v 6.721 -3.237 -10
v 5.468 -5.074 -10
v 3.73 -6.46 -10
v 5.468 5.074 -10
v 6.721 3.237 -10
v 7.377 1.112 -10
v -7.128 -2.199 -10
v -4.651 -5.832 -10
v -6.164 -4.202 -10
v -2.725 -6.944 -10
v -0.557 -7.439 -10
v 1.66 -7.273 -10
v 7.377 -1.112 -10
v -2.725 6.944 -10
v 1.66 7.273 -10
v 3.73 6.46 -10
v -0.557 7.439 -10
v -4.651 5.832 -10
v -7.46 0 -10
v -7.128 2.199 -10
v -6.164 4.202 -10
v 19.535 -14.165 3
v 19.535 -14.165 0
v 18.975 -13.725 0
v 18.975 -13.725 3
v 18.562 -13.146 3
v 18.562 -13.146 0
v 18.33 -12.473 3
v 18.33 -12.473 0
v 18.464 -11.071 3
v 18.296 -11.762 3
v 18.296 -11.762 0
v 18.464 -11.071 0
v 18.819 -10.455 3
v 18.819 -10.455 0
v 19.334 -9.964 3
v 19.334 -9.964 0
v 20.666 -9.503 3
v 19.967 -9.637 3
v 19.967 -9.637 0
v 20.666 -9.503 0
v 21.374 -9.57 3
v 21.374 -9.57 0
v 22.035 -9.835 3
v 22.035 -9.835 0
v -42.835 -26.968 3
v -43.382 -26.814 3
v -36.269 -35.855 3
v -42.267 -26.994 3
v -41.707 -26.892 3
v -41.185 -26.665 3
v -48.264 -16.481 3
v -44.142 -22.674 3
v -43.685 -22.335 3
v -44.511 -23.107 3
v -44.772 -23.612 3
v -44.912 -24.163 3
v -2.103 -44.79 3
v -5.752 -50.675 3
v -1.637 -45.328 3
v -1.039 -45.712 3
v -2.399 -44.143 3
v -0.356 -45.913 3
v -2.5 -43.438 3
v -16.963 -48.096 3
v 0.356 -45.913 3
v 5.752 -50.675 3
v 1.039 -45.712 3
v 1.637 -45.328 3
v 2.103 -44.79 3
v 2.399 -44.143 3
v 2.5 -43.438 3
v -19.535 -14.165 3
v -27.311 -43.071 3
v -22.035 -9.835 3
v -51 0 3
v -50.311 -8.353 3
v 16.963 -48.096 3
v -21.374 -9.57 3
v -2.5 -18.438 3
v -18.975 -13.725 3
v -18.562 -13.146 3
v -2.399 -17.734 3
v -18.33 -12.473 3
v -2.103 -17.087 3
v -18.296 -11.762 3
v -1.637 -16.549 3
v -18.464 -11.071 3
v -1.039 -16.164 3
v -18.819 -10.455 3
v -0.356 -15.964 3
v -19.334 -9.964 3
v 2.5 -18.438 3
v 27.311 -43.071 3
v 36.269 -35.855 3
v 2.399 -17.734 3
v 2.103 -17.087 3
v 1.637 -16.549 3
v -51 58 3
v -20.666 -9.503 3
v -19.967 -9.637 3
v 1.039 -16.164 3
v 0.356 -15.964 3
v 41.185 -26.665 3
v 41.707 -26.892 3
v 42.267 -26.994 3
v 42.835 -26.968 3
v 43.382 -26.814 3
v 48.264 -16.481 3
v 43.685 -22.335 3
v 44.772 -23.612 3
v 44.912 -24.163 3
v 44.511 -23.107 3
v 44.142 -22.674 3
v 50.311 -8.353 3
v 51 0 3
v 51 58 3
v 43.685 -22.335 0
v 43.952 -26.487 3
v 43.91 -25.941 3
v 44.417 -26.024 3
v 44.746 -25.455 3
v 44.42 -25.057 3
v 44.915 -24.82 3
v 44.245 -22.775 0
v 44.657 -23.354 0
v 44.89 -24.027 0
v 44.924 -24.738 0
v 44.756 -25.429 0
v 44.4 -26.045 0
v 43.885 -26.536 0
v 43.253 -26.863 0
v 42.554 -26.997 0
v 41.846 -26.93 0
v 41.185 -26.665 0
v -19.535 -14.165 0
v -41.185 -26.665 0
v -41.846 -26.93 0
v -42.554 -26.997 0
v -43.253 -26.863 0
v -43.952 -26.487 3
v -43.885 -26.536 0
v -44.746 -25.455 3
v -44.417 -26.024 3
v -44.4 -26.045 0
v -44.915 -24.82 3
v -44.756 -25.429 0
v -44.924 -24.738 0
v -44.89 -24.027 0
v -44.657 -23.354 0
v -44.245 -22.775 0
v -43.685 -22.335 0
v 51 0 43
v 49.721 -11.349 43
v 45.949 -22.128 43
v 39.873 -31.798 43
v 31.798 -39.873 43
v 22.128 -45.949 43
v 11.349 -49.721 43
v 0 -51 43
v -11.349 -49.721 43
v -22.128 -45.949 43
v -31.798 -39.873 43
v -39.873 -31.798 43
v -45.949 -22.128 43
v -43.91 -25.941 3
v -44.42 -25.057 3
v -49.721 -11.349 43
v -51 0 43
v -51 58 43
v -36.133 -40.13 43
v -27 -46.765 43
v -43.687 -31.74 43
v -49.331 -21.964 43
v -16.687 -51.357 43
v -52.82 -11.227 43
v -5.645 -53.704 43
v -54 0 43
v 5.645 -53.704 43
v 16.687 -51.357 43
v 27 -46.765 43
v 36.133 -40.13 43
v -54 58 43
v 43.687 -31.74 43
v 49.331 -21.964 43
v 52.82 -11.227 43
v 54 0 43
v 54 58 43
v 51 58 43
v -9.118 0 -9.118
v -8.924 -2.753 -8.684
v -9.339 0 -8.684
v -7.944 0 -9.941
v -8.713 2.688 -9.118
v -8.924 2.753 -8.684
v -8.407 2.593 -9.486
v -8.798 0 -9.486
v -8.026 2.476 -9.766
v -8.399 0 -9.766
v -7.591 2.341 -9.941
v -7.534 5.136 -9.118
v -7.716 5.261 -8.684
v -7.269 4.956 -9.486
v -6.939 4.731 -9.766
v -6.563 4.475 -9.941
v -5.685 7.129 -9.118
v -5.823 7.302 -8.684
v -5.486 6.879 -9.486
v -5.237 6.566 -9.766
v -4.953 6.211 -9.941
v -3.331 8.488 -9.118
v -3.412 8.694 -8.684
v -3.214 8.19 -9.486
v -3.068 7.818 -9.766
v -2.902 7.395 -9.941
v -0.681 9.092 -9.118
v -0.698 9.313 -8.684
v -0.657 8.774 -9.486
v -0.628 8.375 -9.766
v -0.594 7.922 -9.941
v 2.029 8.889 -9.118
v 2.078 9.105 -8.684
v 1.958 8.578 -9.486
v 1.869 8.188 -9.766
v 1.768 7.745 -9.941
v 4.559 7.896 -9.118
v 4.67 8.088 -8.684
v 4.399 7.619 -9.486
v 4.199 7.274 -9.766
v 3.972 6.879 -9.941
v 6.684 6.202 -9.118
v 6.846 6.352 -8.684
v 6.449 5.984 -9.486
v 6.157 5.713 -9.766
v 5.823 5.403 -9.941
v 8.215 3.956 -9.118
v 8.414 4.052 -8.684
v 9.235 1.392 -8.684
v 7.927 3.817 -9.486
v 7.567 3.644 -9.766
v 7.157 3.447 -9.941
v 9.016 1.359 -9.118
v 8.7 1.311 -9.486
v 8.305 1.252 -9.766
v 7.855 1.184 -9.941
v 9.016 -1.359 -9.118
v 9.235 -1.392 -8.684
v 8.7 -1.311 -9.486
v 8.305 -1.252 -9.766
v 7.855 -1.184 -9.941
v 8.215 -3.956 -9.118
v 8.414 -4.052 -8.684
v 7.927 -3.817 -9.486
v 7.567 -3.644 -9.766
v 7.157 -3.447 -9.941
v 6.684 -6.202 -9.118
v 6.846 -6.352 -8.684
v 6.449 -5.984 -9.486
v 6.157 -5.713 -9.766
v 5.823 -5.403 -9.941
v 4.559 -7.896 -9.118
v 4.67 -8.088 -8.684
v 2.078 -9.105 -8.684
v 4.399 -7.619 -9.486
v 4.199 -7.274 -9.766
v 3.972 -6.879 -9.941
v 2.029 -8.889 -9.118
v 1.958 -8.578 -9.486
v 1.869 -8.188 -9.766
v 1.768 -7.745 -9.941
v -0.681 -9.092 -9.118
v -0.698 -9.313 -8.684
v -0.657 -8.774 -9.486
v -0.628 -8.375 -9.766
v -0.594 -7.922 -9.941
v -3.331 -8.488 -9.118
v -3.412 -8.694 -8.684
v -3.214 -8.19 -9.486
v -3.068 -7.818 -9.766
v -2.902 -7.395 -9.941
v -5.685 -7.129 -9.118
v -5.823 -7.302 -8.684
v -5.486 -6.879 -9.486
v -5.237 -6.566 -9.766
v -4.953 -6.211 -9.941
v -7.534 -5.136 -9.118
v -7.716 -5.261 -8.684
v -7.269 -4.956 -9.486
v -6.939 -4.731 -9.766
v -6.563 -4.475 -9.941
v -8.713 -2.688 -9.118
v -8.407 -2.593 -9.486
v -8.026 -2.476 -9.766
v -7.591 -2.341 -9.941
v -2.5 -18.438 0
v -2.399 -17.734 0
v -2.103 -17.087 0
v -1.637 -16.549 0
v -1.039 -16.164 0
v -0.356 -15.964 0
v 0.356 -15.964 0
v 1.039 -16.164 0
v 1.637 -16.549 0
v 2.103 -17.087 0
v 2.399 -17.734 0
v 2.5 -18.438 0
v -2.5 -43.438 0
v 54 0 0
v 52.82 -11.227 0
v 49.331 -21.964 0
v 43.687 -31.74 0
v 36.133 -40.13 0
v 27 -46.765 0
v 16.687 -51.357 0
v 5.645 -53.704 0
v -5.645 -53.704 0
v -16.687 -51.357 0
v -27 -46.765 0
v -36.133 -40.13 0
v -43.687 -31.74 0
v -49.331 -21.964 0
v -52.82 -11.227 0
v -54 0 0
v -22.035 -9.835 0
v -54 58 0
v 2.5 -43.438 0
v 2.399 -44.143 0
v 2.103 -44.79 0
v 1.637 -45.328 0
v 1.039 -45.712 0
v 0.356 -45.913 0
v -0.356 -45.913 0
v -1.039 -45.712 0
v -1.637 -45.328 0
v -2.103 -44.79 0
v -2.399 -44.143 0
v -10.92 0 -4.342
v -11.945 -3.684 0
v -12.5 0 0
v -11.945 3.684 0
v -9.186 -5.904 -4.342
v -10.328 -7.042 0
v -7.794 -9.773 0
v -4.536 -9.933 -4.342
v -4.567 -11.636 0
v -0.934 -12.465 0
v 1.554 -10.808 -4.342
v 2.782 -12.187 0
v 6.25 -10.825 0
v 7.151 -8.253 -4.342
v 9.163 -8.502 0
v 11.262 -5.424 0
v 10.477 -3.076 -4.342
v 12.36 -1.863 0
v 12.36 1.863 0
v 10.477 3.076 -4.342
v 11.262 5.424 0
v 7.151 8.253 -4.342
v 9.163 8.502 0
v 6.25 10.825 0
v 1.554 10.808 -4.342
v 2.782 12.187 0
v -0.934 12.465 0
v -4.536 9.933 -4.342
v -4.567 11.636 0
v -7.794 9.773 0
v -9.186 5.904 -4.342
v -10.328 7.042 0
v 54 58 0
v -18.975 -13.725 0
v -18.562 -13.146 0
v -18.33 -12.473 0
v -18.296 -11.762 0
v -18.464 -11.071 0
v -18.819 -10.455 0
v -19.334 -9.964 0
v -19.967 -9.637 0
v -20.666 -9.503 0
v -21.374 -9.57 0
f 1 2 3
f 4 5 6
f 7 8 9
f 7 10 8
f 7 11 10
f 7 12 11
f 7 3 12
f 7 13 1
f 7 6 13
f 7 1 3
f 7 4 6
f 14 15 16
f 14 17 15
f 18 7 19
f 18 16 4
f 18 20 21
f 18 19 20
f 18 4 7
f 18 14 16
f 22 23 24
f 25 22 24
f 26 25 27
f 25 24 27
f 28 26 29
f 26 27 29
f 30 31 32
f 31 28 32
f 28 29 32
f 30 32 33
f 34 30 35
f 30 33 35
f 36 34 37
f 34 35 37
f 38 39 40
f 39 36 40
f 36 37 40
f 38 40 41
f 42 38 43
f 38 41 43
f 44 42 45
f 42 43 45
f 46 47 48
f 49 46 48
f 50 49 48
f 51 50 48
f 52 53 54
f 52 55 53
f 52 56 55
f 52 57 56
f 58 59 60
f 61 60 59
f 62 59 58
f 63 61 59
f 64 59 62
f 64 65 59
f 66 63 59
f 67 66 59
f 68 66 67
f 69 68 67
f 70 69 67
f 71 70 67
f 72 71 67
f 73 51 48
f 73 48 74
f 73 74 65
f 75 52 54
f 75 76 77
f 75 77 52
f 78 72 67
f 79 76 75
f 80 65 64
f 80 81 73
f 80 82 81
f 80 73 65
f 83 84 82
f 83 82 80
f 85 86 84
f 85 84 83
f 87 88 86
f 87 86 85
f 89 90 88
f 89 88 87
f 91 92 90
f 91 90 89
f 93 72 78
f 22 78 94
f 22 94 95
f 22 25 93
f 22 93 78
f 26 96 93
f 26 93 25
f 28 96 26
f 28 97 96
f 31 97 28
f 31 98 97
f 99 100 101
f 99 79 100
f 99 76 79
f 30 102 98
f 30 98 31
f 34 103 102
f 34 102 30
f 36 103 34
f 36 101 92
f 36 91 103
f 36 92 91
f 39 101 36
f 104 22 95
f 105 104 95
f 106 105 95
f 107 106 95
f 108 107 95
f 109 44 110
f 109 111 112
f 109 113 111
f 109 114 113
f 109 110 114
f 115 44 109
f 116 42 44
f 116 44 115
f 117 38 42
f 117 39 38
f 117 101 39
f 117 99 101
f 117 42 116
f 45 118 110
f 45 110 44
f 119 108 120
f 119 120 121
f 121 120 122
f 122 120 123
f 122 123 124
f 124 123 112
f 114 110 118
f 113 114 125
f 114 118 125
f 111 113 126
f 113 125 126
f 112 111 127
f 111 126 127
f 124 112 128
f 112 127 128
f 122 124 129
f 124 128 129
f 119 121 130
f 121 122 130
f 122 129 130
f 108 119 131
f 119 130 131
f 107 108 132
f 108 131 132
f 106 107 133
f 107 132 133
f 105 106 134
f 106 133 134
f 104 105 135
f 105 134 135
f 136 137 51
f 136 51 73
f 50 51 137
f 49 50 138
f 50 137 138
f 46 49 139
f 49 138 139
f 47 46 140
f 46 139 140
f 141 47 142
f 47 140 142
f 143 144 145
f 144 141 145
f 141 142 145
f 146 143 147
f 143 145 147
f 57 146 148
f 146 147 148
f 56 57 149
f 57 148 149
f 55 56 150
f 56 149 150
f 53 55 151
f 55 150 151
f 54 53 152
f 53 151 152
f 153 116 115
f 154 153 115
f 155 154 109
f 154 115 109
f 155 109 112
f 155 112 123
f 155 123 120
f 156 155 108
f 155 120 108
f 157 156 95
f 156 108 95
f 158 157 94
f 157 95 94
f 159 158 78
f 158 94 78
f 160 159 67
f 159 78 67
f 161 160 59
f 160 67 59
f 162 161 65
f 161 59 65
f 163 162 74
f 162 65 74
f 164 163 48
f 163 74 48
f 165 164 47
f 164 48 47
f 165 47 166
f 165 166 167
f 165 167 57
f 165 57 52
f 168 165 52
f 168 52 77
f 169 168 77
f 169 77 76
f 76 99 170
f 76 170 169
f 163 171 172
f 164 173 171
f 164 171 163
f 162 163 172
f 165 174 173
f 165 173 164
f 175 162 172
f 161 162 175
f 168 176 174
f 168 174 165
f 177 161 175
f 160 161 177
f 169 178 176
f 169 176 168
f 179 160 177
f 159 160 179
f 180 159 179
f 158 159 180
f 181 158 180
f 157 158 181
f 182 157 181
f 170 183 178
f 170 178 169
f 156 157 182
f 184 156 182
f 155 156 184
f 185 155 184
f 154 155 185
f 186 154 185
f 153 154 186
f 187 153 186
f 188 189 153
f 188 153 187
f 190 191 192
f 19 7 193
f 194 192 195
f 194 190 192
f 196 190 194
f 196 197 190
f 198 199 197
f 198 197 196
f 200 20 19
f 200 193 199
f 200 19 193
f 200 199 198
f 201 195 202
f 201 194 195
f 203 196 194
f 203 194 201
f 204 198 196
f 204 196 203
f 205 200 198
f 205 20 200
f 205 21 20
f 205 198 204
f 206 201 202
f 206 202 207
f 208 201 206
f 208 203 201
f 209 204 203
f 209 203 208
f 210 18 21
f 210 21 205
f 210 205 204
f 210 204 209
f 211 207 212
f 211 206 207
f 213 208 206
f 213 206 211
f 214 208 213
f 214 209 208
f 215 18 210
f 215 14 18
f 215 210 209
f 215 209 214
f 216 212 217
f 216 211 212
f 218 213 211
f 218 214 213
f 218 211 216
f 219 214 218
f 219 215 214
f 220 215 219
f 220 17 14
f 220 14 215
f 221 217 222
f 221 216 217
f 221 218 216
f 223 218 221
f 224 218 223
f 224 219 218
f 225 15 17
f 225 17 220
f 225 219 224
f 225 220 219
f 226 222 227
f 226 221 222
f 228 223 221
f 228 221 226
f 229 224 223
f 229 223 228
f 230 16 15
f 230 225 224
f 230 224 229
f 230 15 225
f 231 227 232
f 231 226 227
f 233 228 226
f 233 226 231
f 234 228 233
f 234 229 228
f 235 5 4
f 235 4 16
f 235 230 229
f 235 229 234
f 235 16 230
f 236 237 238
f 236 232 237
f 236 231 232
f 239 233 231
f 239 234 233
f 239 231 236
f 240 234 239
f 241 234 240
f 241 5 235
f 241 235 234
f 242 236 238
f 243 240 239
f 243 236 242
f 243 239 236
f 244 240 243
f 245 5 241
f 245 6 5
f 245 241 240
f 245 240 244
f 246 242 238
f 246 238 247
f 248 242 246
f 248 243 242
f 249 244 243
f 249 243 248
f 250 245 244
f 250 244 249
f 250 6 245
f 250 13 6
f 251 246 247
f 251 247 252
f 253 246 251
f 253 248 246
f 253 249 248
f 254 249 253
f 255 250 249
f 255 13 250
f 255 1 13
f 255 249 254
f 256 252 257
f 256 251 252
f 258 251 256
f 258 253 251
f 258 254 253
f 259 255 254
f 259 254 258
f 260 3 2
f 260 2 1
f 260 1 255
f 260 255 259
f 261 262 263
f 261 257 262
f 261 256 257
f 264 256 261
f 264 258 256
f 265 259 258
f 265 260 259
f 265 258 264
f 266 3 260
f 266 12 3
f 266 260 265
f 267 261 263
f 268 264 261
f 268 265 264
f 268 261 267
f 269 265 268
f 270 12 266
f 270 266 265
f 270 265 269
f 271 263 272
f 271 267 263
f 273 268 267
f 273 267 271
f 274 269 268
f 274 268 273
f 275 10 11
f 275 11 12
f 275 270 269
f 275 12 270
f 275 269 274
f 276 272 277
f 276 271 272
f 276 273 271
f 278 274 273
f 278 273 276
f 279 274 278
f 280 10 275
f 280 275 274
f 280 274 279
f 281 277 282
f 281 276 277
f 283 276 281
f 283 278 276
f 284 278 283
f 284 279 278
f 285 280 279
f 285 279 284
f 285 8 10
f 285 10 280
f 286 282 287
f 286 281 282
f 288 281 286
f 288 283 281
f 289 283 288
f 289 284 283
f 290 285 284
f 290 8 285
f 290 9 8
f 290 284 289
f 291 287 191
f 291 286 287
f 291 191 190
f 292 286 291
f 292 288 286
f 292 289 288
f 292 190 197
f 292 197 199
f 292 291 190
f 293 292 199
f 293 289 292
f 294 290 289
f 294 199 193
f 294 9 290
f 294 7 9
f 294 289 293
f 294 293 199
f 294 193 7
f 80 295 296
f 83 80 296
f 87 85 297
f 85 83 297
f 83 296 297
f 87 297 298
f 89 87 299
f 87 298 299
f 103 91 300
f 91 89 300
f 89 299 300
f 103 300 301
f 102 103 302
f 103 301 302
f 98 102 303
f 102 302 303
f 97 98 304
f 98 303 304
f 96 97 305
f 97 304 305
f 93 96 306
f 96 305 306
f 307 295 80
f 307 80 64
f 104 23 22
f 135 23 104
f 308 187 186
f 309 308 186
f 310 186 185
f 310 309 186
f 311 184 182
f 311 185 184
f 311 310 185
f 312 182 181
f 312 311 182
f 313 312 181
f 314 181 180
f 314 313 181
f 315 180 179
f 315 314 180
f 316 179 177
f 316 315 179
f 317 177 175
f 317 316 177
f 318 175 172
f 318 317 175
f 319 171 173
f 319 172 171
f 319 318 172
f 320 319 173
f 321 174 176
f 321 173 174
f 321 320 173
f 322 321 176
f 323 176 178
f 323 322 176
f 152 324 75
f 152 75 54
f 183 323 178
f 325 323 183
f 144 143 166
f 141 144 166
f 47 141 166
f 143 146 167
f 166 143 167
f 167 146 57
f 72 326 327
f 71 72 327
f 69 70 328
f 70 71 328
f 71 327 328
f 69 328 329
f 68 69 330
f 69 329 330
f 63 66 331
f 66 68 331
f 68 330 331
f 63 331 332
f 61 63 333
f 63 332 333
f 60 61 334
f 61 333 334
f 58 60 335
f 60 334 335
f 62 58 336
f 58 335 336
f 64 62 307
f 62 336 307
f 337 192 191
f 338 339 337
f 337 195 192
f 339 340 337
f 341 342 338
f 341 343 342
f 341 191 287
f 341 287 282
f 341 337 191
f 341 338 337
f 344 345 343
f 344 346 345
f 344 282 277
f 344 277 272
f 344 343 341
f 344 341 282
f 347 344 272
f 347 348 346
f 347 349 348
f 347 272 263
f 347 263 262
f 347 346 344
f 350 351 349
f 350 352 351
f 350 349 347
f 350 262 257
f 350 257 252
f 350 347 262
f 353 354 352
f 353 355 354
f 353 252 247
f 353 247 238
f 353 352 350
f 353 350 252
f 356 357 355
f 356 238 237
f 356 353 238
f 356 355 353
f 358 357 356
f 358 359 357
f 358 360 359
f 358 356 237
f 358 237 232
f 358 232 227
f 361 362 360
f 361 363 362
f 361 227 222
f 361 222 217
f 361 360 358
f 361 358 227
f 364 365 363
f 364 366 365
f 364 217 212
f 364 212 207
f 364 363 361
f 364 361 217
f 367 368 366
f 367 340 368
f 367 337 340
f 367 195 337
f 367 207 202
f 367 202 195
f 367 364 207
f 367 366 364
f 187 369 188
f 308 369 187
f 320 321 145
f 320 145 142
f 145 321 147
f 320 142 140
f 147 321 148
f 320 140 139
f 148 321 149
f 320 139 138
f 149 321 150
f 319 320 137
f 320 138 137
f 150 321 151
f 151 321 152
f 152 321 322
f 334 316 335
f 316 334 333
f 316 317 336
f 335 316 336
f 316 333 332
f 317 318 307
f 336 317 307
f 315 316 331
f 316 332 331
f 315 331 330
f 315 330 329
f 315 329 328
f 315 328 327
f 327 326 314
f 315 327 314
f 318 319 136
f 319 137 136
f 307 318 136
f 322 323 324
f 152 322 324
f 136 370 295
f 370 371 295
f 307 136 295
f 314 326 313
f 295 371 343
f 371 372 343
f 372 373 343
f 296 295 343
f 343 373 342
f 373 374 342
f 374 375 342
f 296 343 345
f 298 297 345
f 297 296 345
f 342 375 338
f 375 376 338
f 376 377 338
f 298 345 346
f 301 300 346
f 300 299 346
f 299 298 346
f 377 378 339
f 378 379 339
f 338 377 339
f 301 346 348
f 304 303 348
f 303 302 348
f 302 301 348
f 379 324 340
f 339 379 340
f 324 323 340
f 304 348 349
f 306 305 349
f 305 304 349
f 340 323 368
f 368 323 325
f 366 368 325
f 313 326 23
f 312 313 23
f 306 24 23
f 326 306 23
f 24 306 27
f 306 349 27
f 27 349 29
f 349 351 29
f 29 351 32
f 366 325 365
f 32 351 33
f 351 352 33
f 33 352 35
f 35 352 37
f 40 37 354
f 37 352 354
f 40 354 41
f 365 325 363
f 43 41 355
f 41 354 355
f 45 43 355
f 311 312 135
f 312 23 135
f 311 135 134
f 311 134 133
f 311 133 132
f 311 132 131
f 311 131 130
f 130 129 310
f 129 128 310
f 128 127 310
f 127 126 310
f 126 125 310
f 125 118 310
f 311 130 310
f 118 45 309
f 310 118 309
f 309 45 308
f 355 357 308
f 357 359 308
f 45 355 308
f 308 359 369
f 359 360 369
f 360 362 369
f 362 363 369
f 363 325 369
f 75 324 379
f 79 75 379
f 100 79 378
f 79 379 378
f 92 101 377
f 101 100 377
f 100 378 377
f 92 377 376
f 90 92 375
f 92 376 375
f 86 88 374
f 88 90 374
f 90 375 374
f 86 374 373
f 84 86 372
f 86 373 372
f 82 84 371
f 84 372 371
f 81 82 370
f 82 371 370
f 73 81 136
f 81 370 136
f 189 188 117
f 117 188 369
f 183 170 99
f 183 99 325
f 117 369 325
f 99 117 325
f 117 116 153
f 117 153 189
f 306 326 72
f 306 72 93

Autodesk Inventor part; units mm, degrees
ref_plane "YZ Plane" through (0, 0, 0) normal (1, 0, 0) x (0, 1, 0)
ref_plane "XZ Plane" through (0, 0, 0) normal (0, 1, 0) x (-1, 0, 0)
ref_plane "XY Plane" through (0, 0, 0) normal (0, 0, 1) x (1, 0, 0)
sketch "Boceto1" plane through (0, 0, 0) normal (0, 0, 1) x (1, 0, 0)
  arc A0 (-54, 0) -> (54, 0) centre (0, 0) ccw
  line L0 (-54, 0) -> (-54, 58)
  line L1 (54, 58) -> (54, 0)
  arc A1 (54, 0) -> (-54, 0) centre (0, 0) ccw construction
  line L2 (0, -54) -> (0, 58) construction
  line L3 (54, 58) -> (-54, 58)
  line L4 (54, 58) -> (54, 58)
  line L5 (-54, 58) -> (-54, 58)
  line L6 (-54, 58) -> (0, 58) construction
  line L7 (0, 58) -> (54, 58) construction
  line L8 (0, -43.4382) -> (0, -18.4382) construction
  line L9 (2.5, -43.4382) -> (2.5, -18.4382)
  line L10 (-2.5, -18.4382) -> (-2.5, -43.4382)
  arc A2 (-2.5, -43.4382) -> (2.5, -43.4382) centre (0, -43.4382) ccw
  arc A3 (2.5, -18.4382) -> (-2.5, -18.4382) centre (0, -18.4382) ccw
  line L11 (0, 0) -> (-46.7654, -27) construction
  line L12 (0, 0) -> (46.7654, -27) construction
  line L13 (-42.4352, -24.5) -> (-20.7846, -12) construction
  line L14 (-41.1852, -26.6651) -> (-19.5346, -14.1651)
  line L15 (-22.0346, -9.8349) -> (-43.6852, -22.3349)
  arc A4 (-43.6852, -22.3349) -> (-41.1852, -26.6651) centre (-42.4352, -24.5) ccw
  arc A5 (-19.5346, -14.1651) -> (-22.0346, -9.8349) centre (-20.7846, -12) ccw
  line L16 (42.4352, -24.5) -> (20.7846, -12) construction
  line L17 (43.6852, -22.3349) -> (22.0346, -9.8349)
  line L18 (19.5346, -14.1651) -> (41.1852, -26.6651)
  arc A6 (41.1852, -26.6651) -> (43.6852, -22.3349) centre (42.4352, -24.5) ccw
  arc A7 (22.0346, -9.8349) -> (19.5346, -14.1651) centre (20.7846, -12) ccw
  point P0 (0, -30.9382)
  point P1 (-31.6099, -18.25)
  point P2 (31.6099, -18.25)
  dimension "d0" = 108
  dimension "d2" = 112
  dimension "d11" = 60
  dimension "d12" = 60
  dimension "d13" = 5
  dimension "d14" = 5
  dimension "d15" = 5
  dimension "d16" = 25
  dimension "d17" = 25
  dimension "d18" = 25
  dimension "d19" = 5
  dimension "d20" = 5
extrude "Extrusión2" add sketch "Boceto1" along normal blind 3
sketch "Boceto2" plane through (0, 0, 3) normal (0, 0, 1) x (1, 0, 0)
  arc A0 (-54, 0) -> (54, 0) centre (0, 0) ccw projected
  line L0 (54, 0) -> (54, 58) projected
  line L1 (54, 58) -> (-54, 58) construction
  line L2 (-54, 58) -> (-54, 0) projected
  arc A1 (-51, 0) -> (51, 0) centre (0, 0) ccw
  line L3 (51, 0) -> (51, 55)
  line L4 (51, 55) -> (-51, 55) construction
  line L5 (-51, 55) -> (-51, 0)
  line L6 (-51, 55) -> (-51, 58)
  line L7 (51, 55) -> (51, 58)
  line L8 (54, 58) -> (51, 58)
  line L9 (54, 58) -> (-54, 58) projected
  line L10 (-51, 58) -> (-54, 58)
  dimension "d8" = 3
extrude "Extrusión3" add sketch "Boceto2" along normal blind 40 contours L2 L9 L6 L5 A1 L3 L7 L8 L0 A0
sketch "Boceto3" plane through (0, 0, 0) normal (0, 0, -1) x (-1, 0, 0)
  circle A0 centre (0, 0) radius 12.5
  dimension "d21" = 25
extrude "Extrusión4" add sketch "Boceto3" along normal blind 10 draft -20
fillet "Empalme1" radius 2 1 edges at (8.8603, 0, -10)
properties part number "_3DPrint"
